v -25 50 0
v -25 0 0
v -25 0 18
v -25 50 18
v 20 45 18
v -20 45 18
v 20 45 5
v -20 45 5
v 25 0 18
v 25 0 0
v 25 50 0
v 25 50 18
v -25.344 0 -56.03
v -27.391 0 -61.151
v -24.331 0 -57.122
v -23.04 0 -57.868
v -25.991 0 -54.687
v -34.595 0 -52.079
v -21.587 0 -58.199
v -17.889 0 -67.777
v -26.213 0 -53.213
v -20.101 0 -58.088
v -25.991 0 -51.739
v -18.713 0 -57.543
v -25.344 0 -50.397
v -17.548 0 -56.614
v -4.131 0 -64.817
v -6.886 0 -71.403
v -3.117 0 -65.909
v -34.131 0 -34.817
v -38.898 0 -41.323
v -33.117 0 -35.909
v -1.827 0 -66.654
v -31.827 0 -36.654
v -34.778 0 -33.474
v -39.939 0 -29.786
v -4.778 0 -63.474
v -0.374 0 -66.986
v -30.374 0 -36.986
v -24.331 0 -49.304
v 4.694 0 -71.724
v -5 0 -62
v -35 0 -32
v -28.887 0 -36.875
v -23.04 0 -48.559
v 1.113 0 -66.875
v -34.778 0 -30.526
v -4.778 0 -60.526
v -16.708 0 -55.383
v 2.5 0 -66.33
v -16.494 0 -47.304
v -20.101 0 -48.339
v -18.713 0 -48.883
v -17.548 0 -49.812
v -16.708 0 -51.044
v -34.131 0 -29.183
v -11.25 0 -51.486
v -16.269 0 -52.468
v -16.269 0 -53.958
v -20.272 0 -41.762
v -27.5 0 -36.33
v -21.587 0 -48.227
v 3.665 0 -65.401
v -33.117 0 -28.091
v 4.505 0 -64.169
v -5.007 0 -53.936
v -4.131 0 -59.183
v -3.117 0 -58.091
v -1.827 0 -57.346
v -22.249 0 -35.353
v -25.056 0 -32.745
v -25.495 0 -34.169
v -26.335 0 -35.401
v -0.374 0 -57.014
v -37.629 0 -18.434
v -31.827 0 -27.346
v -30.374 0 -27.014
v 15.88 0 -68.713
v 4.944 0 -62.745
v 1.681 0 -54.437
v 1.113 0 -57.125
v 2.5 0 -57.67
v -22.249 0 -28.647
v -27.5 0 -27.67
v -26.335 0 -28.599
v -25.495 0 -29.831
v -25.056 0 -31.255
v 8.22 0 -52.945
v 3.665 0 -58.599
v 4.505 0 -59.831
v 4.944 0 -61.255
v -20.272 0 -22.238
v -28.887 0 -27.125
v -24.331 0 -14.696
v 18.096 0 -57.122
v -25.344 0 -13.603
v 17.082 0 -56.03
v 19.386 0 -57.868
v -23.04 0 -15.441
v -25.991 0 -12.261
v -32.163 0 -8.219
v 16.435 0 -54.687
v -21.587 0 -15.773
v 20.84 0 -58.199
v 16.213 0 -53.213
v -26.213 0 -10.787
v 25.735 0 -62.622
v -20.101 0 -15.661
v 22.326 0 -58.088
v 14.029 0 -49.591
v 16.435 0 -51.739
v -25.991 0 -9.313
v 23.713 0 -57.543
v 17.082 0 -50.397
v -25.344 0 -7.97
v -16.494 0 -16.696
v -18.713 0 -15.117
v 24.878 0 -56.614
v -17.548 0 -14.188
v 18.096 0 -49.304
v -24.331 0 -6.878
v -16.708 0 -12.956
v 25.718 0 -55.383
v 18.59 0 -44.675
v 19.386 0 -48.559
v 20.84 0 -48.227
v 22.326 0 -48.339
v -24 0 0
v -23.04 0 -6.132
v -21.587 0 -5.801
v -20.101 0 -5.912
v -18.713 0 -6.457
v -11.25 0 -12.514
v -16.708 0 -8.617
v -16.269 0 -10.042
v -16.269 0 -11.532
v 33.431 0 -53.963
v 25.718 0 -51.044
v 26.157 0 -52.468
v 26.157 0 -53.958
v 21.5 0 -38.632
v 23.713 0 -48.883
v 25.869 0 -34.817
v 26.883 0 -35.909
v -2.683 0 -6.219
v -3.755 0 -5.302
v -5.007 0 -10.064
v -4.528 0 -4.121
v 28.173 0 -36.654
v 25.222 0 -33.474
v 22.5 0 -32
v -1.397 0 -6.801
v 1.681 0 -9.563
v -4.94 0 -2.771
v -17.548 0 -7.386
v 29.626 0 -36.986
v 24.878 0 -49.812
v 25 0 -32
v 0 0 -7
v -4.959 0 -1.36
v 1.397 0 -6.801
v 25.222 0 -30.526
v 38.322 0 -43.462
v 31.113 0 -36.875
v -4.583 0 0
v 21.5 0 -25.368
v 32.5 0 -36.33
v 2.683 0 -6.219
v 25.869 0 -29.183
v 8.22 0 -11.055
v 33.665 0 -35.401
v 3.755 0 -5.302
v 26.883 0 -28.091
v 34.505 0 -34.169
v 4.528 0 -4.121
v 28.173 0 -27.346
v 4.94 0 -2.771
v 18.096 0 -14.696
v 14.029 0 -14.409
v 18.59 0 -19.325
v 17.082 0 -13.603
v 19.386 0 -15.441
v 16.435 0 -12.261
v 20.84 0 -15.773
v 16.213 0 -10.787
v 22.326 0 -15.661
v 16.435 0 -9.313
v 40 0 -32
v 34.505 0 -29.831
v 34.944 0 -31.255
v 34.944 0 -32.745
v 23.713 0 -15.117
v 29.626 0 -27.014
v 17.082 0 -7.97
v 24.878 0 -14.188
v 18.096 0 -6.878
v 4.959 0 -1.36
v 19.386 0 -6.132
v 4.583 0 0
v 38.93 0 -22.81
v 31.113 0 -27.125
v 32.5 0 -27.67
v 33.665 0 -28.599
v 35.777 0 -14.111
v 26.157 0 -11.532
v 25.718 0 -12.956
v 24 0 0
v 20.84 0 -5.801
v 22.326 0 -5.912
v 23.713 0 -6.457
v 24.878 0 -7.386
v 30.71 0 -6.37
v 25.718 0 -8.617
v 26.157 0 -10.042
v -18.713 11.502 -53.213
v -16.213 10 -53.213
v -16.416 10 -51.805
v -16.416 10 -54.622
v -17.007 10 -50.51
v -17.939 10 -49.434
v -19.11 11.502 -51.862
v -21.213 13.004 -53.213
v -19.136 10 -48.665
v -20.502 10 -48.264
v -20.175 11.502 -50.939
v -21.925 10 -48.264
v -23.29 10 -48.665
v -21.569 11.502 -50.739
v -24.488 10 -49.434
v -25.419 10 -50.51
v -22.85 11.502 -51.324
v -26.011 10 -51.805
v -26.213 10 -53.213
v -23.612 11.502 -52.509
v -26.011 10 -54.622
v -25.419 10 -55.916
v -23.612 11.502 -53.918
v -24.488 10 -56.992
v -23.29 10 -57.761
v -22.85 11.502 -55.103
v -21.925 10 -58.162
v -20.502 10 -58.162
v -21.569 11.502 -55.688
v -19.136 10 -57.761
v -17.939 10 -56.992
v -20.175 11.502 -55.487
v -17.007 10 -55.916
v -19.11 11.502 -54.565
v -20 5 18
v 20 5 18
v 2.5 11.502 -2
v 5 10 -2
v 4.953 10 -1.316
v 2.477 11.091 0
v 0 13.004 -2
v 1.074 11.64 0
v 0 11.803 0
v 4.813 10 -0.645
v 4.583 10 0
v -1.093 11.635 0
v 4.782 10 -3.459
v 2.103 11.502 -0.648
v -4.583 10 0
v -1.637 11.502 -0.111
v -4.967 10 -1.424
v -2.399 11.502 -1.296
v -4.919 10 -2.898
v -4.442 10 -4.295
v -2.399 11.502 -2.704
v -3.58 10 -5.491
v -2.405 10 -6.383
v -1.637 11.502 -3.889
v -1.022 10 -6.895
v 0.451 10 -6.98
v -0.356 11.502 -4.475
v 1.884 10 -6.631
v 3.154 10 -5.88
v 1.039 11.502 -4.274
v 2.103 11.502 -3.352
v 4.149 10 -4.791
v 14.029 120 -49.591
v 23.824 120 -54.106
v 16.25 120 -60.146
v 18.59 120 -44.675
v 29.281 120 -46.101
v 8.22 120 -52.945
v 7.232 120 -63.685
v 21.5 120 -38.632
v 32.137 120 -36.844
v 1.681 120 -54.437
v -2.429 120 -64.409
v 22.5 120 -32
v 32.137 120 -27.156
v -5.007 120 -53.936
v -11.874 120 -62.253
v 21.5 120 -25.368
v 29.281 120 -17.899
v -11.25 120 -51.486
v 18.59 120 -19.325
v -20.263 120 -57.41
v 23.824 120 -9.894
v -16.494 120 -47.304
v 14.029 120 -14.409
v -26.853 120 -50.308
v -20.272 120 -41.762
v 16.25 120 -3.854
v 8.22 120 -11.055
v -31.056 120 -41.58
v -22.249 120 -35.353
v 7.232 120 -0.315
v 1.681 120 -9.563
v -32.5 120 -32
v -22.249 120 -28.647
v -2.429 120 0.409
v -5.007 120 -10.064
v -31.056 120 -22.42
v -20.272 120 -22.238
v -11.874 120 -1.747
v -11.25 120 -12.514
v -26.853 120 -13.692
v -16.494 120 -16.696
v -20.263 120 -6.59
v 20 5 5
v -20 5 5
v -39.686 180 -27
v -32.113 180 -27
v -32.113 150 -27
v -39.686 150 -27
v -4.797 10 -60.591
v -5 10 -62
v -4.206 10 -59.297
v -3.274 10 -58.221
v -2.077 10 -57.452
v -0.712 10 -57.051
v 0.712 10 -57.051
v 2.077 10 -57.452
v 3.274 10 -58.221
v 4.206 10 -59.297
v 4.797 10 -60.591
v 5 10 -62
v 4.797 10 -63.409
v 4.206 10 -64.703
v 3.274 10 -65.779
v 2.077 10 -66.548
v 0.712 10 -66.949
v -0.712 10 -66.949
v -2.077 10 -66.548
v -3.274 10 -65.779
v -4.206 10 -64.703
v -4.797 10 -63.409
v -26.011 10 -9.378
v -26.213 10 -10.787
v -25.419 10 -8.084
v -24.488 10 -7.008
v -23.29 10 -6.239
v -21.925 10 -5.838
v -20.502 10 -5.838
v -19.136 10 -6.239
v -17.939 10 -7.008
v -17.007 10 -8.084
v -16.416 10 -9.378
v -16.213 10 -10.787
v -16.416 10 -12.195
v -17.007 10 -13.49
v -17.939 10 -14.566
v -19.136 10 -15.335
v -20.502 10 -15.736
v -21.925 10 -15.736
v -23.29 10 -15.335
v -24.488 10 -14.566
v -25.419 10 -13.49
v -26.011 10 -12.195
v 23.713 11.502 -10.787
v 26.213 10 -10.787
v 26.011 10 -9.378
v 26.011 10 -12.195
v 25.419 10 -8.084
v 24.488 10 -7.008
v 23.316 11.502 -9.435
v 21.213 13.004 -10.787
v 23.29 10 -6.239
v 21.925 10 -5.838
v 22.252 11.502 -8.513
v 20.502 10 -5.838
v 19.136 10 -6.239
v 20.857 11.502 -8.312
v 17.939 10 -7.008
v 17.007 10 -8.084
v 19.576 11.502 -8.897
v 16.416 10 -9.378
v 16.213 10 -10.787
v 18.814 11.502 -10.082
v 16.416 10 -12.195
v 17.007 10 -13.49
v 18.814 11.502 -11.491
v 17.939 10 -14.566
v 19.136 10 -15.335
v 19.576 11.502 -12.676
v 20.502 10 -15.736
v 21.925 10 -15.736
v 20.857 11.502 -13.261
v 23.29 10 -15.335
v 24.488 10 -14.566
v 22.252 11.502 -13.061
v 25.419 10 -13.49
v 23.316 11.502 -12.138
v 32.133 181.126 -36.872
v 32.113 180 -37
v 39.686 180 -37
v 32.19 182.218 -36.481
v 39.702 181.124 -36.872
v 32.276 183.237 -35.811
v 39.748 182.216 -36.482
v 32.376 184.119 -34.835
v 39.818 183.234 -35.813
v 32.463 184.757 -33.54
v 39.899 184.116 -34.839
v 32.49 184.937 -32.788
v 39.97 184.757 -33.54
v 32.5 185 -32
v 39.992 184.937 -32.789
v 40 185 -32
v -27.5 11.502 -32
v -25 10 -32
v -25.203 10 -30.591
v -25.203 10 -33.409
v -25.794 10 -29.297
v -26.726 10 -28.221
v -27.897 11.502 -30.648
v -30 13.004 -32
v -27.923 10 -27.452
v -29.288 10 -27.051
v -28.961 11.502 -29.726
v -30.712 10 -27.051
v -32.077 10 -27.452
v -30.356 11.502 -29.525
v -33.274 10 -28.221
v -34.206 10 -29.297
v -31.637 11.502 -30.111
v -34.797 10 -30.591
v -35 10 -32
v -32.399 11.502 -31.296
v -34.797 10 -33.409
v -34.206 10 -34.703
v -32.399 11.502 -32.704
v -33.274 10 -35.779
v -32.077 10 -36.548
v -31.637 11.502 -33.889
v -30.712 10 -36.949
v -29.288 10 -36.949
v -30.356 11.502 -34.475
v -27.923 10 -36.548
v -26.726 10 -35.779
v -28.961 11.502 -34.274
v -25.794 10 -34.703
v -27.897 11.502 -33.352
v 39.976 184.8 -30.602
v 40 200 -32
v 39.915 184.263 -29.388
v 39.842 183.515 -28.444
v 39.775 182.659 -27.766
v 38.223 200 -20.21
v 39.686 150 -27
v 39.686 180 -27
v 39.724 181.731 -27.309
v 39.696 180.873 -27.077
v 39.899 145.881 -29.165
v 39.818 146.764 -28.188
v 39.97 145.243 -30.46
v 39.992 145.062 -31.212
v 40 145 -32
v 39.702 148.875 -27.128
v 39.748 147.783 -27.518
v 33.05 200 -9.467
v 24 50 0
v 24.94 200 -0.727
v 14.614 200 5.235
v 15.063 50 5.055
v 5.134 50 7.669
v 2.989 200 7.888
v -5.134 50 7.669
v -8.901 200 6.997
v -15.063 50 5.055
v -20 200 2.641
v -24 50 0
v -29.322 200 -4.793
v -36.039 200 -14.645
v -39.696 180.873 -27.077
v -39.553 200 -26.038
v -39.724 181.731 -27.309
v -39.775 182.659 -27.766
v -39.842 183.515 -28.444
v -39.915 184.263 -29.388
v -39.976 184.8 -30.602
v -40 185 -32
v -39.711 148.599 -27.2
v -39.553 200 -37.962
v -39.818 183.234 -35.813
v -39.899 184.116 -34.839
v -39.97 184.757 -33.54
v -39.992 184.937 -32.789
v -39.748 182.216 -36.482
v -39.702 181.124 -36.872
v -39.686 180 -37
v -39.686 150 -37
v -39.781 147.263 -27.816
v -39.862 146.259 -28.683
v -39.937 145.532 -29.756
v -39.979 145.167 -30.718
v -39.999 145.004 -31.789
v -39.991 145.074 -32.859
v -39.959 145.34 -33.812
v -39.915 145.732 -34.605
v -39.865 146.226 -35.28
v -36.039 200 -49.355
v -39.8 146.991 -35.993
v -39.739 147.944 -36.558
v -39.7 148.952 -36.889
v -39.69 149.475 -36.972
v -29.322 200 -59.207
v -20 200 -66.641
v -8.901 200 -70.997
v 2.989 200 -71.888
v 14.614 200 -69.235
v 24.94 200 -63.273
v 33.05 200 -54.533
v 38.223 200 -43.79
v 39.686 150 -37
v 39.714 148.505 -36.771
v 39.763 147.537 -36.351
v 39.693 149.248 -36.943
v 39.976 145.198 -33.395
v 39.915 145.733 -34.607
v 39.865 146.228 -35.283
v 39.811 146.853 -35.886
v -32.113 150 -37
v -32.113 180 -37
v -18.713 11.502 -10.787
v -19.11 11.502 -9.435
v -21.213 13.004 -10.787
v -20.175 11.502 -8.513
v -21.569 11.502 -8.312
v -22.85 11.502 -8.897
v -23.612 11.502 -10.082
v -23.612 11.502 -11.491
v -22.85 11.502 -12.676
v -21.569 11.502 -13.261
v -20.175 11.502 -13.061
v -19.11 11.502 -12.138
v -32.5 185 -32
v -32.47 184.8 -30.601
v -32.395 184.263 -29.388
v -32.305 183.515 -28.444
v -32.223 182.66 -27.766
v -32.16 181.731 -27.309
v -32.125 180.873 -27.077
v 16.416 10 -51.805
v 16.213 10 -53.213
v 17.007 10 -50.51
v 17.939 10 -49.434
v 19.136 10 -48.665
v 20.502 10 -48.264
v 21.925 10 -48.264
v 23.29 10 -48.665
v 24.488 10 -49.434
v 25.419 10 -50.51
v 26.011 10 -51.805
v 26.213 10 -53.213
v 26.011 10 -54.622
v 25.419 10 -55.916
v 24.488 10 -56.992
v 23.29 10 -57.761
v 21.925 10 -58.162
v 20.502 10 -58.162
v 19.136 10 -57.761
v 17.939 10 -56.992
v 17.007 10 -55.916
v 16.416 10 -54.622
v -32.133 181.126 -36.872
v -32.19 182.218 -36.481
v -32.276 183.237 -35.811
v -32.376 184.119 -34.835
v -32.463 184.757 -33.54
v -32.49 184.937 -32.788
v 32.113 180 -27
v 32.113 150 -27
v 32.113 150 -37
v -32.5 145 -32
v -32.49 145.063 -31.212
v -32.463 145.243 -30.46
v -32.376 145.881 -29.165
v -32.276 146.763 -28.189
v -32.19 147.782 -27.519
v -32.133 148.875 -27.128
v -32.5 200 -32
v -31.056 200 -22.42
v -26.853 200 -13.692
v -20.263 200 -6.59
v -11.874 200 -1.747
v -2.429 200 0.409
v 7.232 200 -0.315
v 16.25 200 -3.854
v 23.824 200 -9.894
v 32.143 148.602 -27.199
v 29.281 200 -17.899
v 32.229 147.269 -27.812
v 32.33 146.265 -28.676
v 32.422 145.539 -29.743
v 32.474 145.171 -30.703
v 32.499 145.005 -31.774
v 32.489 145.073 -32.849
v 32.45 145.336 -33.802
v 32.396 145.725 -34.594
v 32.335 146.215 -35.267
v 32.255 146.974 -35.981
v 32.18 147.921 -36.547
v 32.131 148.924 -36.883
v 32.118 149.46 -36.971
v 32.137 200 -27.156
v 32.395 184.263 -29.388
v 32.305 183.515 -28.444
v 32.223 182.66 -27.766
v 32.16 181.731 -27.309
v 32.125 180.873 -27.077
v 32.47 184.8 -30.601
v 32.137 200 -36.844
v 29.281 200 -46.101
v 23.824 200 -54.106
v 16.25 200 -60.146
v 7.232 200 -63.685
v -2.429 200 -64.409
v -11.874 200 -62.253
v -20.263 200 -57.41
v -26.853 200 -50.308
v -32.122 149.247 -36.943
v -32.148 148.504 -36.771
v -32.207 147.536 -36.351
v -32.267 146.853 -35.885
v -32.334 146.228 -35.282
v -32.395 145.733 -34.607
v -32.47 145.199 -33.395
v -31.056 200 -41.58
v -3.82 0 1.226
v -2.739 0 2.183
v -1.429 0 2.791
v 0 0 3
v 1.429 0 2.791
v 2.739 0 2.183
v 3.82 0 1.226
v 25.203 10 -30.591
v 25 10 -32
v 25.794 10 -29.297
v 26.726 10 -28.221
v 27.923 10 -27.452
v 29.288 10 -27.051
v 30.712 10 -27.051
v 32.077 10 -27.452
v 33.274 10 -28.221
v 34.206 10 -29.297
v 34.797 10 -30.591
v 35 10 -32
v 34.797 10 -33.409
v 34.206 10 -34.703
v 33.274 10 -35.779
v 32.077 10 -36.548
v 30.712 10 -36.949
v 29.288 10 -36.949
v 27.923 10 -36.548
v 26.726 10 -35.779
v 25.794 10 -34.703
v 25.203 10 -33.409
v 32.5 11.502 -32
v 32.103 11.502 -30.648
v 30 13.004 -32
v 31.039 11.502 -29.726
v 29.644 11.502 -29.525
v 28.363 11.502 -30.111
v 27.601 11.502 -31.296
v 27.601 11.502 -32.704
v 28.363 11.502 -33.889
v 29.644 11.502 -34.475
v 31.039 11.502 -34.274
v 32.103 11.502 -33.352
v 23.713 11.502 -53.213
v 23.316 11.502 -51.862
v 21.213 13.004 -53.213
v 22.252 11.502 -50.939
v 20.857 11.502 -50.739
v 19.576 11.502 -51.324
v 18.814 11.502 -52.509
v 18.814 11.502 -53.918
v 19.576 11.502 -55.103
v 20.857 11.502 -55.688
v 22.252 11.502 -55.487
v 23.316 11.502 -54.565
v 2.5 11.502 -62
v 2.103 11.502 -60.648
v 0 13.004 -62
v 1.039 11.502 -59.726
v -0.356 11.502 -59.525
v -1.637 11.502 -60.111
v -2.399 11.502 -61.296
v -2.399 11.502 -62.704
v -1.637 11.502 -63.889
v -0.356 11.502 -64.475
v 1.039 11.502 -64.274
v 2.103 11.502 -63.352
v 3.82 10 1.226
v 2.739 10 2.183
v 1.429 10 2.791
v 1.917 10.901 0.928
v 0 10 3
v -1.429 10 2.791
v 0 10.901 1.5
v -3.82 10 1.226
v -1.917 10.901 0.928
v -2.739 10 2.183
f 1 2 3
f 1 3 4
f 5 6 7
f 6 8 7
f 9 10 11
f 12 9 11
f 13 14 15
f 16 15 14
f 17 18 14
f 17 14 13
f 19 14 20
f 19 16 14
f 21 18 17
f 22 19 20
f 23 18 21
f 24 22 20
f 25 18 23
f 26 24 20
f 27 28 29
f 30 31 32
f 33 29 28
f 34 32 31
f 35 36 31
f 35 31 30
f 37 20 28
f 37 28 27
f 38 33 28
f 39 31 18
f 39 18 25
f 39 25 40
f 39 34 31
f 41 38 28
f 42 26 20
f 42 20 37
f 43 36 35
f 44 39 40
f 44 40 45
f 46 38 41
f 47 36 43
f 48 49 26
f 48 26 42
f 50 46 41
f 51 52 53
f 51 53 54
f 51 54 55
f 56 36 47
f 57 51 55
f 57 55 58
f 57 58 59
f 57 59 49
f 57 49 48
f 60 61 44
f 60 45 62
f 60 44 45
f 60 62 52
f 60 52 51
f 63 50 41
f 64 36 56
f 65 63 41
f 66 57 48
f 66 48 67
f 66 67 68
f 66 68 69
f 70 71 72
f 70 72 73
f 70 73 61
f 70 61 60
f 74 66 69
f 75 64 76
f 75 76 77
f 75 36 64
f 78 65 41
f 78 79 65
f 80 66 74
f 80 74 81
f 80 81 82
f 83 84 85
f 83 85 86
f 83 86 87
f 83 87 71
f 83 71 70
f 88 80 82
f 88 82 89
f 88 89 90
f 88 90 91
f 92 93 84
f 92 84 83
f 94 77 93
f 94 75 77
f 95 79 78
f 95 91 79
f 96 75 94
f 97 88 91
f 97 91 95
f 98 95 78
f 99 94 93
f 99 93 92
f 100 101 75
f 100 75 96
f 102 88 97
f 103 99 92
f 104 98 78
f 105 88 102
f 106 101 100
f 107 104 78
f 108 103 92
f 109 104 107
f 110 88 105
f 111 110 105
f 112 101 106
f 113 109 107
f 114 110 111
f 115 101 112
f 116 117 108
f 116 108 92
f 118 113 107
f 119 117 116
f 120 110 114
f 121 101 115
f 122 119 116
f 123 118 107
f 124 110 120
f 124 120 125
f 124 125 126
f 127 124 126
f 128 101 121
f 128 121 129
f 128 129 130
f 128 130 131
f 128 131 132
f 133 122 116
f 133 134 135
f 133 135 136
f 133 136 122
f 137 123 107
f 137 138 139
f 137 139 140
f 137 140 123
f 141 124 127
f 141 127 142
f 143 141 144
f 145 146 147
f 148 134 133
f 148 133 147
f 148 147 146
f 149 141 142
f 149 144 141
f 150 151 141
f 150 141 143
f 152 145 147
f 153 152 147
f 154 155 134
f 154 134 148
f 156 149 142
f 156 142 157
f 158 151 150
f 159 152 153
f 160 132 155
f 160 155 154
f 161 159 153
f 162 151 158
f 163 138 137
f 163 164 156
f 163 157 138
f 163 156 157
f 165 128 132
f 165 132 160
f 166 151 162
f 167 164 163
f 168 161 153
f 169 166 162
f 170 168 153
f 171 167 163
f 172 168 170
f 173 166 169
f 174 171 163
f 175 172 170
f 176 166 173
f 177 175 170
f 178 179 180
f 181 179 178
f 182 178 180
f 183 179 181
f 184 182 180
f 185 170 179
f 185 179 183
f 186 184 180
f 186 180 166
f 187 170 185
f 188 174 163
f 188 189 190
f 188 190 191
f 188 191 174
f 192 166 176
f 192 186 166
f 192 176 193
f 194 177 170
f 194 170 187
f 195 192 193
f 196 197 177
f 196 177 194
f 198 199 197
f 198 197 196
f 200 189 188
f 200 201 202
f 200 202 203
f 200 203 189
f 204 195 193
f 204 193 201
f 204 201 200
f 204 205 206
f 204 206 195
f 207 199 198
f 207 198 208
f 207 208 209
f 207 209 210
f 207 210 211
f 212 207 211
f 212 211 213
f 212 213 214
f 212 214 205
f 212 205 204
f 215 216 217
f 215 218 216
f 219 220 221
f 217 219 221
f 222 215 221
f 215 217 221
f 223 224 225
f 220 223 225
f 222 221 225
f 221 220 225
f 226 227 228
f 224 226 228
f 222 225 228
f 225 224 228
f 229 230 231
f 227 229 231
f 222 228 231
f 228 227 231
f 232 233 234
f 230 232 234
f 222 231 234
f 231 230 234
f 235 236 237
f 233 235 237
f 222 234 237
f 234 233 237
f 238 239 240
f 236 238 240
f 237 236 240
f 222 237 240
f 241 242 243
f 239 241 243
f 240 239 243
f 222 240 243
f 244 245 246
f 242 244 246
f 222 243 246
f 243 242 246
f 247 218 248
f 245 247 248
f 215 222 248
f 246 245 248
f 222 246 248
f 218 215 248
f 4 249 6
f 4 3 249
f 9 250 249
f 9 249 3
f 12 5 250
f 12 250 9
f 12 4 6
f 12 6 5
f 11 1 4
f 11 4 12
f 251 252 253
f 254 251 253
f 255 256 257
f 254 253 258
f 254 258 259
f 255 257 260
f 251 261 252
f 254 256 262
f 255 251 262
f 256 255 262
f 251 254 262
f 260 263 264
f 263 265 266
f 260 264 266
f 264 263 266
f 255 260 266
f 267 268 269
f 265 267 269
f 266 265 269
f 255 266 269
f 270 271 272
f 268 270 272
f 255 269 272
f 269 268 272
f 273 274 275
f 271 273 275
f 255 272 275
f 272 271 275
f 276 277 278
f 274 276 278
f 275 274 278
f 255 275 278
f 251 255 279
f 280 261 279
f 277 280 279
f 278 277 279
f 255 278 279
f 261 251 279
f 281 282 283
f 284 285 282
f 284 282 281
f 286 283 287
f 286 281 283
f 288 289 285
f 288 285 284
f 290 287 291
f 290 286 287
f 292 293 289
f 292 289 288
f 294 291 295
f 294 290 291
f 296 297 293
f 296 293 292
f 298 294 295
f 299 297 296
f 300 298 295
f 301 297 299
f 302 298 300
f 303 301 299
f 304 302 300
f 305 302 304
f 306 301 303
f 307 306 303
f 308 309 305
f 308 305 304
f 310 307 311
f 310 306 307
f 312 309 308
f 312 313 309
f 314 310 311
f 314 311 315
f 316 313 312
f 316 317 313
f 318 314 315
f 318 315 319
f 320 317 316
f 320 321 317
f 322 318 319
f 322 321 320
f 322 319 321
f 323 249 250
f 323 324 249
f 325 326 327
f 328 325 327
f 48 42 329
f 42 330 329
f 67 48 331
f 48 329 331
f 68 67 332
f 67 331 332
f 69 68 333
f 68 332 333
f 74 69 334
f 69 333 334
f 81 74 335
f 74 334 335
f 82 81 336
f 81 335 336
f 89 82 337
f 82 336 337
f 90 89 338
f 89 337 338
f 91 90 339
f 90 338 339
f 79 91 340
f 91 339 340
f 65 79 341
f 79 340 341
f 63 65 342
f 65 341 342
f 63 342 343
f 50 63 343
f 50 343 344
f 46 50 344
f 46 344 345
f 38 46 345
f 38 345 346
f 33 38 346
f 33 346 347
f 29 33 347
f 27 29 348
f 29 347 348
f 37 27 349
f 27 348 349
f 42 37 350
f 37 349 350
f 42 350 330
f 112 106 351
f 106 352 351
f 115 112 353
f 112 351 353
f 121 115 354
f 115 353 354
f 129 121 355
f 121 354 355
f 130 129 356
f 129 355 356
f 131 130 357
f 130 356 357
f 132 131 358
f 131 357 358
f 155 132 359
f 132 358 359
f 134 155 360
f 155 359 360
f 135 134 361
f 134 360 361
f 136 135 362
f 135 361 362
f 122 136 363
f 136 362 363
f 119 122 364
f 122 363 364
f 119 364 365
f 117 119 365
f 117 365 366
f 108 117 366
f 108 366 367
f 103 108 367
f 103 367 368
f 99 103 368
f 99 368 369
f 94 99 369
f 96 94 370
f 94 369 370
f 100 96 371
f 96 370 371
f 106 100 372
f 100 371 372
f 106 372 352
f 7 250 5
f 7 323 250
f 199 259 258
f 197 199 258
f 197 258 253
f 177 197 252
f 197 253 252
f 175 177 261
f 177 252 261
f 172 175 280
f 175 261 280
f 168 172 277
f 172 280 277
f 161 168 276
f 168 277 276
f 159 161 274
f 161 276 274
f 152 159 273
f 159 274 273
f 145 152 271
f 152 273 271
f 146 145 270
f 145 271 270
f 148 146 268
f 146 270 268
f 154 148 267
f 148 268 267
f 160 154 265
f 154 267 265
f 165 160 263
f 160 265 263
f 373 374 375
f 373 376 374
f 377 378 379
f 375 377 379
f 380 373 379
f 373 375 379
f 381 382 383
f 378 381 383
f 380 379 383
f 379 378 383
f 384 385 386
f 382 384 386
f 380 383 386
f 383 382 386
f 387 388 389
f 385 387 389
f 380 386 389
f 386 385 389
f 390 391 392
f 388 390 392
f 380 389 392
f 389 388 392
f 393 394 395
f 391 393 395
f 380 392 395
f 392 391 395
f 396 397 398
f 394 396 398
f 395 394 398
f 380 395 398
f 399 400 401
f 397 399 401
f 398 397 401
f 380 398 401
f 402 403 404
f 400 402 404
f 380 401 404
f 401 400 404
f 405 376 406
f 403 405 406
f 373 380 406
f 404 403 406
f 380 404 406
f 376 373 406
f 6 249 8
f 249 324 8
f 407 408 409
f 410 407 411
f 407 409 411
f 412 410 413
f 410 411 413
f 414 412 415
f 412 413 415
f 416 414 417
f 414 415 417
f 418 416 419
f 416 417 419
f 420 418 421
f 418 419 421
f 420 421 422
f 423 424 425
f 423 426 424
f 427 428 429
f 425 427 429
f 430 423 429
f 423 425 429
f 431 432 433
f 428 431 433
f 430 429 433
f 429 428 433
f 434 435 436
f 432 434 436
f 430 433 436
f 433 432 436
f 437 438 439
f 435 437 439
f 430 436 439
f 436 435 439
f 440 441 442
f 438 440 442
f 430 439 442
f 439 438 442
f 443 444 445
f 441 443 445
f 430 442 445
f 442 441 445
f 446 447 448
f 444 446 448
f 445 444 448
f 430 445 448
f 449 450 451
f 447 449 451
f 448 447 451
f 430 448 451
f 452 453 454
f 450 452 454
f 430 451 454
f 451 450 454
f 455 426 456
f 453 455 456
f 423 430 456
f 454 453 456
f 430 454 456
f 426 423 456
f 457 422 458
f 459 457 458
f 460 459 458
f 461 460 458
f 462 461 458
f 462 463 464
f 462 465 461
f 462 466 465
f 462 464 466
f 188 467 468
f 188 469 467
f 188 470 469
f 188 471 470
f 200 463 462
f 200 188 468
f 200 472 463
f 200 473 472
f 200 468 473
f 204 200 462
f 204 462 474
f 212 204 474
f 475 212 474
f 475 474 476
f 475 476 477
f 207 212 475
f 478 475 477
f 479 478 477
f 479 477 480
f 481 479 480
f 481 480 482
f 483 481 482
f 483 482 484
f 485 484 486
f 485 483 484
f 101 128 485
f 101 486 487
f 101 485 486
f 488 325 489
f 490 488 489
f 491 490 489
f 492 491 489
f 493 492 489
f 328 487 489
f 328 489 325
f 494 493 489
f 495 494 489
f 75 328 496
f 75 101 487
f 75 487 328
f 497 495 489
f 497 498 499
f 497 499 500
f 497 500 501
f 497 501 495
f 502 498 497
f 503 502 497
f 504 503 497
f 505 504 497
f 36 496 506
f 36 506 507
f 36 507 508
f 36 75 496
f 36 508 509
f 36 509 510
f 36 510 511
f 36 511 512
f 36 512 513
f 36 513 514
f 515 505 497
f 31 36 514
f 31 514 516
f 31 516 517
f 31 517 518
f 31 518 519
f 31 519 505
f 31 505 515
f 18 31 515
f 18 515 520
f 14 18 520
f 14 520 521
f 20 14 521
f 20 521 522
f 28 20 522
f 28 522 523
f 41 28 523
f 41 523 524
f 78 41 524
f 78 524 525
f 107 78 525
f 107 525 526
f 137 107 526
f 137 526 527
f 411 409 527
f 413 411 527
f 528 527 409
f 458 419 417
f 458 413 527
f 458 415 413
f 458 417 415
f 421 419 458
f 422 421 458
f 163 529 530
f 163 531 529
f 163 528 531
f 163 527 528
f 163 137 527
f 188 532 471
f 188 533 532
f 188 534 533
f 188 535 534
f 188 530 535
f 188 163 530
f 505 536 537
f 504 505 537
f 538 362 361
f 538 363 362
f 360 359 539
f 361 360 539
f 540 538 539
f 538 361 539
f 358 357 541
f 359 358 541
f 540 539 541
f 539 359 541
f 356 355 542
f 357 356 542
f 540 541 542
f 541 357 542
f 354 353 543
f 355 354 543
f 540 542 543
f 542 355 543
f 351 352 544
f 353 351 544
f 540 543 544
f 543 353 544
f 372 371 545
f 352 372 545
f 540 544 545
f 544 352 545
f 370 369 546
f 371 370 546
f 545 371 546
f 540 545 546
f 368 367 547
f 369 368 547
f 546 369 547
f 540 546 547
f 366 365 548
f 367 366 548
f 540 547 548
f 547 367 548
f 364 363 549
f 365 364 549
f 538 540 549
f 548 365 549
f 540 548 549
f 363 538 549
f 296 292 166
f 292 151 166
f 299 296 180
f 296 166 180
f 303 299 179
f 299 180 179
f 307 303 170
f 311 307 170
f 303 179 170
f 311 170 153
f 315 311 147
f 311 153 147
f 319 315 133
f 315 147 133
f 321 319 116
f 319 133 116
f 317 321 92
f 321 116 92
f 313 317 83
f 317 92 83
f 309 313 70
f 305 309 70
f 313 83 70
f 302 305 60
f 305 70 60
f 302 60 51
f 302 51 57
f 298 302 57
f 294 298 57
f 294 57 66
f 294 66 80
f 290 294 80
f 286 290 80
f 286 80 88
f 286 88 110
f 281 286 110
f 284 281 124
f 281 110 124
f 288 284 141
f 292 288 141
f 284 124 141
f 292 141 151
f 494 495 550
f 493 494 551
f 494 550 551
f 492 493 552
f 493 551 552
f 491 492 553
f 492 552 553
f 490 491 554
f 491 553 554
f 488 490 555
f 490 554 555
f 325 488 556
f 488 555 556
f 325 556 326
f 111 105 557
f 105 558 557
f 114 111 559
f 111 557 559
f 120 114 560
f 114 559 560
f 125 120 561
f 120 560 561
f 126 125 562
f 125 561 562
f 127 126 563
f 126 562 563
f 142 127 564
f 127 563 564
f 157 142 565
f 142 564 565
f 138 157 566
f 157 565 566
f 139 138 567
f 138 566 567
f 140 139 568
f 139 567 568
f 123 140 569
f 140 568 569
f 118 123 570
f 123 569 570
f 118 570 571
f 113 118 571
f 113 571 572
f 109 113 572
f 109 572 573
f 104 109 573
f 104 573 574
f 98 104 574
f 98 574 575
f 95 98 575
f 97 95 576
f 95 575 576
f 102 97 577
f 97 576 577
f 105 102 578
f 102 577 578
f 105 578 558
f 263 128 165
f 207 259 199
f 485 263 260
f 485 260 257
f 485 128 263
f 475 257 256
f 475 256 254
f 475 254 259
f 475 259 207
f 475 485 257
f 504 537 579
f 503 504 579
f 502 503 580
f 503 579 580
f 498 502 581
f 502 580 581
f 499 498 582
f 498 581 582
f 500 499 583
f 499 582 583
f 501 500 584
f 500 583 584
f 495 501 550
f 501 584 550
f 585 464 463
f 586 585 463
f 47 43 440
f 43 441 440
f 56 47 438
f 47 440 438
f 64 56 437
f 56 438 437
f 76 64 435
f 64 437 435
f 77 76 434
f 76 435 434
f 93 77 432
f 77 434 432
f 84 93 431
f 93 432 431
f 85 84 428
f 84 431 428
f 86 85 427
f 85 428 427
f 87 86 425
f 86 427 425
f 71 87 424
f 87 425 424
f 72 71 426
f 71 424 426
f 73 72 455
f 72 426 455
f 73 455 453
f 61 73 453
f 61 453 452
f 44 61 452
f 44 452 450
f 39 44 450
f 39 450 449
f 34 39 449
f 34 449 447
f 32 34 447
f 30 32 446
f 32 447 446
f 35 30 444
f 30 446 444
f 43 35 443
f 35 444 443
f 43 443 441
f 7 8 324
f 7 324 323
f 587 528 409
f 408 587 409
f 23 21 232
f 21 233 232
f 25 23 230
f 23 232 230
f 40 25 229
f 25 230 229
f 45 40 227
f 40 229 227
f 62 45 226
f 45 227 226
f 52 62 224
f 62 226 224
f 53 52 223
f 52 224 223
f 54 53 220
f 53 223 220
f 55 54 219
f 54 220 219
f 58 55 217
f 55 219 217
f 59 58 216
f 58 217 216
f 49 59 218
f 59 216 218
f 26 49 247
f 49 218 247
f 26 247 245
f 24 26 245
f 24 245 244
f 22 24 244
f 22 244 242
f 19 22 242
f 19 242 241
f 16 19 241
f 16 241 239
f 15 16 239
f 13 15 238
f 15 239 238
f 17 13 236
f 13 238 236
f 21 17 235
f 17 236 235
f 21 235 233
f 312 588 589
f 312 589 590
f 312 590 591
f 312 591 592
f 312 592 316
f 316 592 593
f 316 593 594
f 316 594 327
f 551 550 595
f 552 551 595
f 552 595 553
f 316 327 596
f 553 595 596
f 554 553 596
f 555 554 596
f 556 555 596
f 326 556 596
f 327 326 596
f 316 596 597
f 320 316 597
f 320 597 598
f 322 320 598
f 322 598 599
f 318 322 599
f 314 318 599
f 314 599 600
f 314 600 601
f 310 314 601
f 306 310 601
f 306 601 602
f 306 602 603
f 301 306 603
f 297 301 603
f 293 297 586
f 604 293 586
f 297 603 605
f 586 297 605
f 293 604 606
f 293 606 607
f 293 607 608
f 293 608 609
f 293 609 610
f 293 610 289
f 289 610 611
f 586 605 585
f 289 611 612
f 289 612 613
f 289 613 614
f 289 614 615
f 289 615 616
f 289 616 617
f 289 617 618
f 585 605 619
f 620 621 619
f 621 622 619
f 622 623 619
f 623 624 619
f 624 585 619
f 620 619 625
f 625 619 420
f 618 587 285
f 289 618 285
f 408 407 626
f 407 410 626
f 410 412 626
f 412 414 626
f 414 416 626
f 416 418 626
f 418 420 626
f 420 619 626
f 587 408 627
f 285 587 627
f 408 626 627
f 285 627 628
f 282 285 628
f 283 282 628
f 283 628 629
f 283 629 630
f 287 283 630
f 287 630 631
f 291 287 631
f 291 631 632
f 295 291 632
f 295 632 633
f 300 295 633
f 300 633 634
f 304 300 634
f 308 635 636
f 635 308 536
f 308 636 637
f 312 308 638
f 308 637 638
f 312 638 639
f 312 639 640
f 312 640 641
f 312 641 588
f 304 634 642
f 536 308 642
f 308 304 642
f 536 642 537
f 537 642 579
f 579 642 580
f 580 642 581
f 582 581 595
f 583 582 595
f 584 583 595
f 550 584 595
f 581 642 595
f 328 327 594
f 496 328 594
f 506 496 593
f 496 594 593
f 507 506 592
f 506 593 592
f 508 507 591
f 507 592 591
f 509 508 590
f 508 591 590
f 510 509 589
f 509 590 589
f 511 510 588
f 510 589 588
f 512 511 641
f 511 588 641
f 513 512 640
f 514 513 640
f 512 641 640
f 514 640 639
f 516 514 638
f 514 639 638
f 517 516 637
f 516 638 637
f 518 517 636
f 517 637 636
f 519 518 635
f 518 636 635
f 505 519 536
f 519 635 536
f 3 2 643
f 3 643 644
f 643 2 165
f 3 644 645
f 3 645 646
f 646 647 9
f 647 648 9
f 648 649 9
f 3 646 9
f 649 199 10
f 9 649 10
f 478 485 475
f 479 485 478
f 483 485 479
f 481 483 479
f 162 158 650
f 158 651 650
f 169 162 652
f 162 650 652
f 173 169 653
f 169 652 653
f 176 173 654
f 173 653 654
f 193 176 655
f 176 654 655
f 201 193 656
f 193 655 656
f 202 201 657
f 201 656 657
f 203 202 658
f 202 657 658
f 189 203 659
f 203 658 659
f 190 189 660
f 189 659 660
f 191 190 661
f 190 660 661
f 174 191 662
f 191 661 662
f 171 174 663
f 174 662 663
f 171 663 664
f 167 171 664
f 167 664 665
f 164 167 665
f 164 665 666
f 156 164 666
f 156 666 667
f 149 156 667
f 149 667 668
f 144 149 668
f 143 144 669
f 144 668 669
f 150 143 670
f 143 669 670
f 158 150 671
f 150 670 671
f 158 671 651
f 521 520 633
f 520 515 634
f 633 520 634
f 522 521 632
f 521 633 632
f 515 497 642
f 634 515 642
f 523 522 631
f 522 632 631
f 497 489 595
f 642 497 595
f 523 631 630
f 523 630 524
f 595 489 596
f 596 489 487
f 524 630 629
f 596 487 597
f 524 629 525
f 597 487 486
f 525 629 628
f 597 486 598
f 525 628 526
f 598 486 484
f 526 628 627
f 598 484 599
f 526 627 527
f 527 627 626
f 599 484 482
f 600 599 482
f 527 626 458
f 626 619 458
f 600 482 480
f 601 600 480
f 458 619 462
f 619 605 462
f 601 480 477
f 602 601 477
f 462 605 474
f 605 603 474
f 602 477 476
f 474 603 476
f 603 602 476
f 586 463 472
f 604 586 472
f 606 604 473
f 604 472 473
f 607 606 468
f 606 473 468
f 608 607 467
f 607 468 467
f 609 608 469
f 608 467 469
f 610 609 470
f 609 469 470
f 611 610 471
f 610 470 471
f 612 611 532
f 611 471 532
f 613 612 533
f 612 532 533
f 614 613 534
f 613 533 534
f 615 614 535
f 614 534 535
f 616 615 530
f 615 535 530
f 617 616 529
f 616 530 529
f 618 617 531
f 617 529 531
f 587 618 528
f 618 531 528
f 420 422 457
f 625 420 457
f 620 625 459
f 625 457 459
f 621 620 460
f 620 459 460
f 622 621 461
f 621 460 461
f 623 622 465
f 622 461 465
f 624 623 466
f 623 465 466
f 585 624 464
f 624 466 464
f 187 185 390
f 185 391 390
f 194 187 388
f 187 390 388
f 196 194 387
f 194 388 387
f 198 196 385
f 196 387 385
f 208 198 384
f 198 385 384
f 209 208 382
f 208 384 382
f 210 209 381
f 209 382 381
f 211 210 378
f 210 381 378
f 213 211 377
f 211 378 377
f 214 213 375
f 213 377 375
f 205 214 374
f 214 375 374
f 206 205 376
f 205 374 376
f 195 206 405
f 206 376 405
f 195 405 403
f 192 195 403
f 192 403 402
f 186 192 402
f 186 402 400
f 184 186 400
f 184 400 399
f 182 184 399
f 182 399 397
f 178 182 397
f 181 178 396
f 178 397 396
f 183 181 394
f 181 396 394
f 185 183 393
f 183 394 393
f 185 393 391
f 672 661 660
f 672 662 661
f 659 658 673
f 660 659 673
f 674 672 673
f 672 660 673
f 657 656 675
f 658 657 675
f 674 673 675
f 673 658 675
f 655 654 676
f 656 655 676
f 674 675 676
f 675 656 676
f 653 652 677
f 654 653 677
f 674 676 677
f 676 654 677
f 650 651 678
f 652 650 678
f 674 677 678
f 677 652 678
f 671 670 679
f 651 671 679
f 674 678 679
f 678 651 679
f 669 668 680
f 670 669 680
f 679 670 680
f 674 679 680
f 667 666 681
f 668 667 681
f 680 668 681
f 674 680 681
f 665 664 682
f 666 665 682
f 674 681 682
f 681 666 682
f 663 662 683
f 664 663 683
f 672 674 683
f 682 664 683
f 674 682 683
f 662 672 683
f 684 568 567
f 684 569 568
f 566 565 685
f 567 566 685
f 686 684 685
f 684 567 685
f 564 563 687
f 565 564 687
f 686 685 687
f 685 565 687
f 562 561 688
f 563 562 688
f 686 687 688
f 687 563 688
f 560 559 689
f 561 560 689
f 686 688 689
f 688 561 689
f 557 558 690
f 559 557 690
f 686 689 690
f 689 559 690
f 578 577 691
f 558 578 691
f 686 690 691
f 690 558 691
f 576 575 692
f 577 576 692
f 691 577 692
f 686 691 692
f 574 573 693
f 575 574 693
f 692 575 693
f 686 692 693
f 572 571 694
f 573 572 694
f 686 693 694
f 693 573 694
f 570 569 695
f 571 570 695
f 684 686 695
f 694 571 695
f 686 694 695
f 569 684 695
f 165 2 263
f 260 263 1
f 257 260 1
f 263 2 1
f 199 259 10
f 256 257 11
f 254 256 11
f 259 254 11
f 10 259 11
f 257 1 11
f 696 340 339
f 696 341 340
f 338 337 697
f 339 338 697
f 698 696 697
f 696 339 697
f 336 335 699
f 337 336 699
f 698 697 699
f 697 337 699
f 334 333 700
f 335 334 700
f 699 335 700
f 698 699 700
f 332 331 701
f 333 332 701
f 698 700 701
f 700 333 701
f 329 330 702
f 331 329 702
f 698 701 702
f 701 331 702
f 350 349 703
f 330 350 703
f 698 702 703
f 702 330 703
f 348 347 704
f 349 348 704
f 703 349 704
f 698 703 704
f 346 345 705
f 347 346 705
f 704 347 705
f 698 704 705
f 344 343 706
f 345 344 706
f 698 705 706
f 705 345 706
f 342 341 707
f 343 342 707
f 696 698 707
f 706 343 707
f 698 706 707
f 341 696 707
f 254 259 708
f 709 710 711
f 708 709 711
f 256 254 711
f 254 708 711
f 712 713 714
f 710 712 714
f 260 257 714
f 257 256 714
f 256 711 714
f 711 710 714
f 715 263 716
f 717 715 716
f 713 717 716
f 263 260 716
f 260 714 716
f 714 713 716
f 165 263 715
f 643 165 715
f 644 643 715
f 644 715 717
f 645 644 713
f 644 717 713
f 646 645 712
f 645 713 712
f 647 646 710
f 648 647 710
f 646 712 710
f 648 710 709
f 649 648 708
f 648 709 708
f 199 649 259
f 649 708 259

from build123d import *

# Parameters (mm, degrees)
F0_R           = 40
F1_DEPTH       = 200
F2_W           = 50
F2_H           = 50
F3_DEPTH       = 25
F4_DEPTH       = 18
F5_T           = -5
F7_D           = 45
F7_CBORE_D     = 65
F7_CBORE_DEPTH = 80
F9_D           = 10
F9_DEPTH       = 10
F9_TIP         = 3.0043030951
F9_2_D         = 10
F9_2_DEPTH     = 10
F9_2_TIP       = 3.0043030951
F12_DEPTH      = 50


with BuildPart() as f1:
    # F0 (on Front) → F1 (new body)
    with BuildSketch(Plane.XZ):
        with Locations((0, -32)):
            Circle(F0_R)
    extrude(amount=-F1_DEPTH)

    # F2 (on Top) → F3 (cut)
    with BuildSketch(Plane.XY):
        with Locations((0, 25)):
            Rectangle(F2_W, F2_H)
    extrude(amount=F3_DEPTH, mode=Mode.SUBTRACT)

    # F7 (through all)
    with Locations(Plane(origin=(0, 200, 0), x_dir=(-1, 0, 0), z_dir=(0, 1, 0))):
        with Locations((0, -32)):
            CounterBoreHole(F7_D / 2, F7_CBORE_D / 2, F7_CBORE_DEPTH)

    # F9
    with Locations(Plane.XZ):
        with Locations((21.2132034356, -10.7867965644), (30, -32), (21.2132034356, -53.2132034356), (0, -62), (-21.2132034356, -53.2132034356), (-30, -32), (-21.2132034356, -10.7867965644), (0, -2)):
            Hole(F9_D / 2, depth=F9_DEPTH)
            with Locations((0, 0, -(F9_DEPTH + F9_TIP / 2))):  # 118° drill point
                Cone(0, F9_D / 2, F9_TIP, mode=Mode.SUBTRACT)

    # F11 (on Right) → F12 (cut, symmetric)
    with BuildSketch(Plane.YZ):
        with BuildLine():
            Line((180, -27), (150, -27))
            ThreePointArc((150, -27), (146.4644660941, -28.4644660941), (145, -32))
            ThreePointArc((145, -32), (146.4644660941, -35.5355339059), (150, -37))
            Line((150, -37), (180, -37))
            ThreePointArc((180, -37), (183.5355339059, -35.5355339059), (185, -32))
            ThreePointArc((185, -32), (183.5355339059, -28.4644660941), (180, -27))
        make_face()
    extrude(amount=F12_DEPTH, both=True, mode=Mode.SUBTRACT)


with BuildPart() as f4:
    # F2 (on Top) → F4 (new body)
    with BuildSketch(Plane.XY):
        with Locations((0, 25)):
            Rectangle(F2_W, F2_H)
    extrude(amount=F4_DEPTH)

    # F5
    f5_openings = [f4.faces().sort_by_distance(p)[0] for p in [
        (0, 25, 18),
    ]]
    offset(amount=F5_T, openings=f5_openings)

    # F9#2
    with Locations(Plane.XZ):
        with Locations((21.2132034356, -10.7867965644), (30, -32), (21.2132034356, -53.2132034356), (0, -62), (-21.2132034356, -53.2132034356), (-30, -32), (-21.2132034356, -10.7867965644), (0, -2)):
            Hole(F9_2_D / 2, depth=F9_2_DEPTH)
            with Locations((0, 0, -(F9_2_DEPTH + F9_2_TIP / 2))):  # 118° drill point
                Cone(0, F9_2_D / 2, F9_2_TIP, mode=Mode.SUBTRACT)


solid = Compound([f1.part, f4.part])
